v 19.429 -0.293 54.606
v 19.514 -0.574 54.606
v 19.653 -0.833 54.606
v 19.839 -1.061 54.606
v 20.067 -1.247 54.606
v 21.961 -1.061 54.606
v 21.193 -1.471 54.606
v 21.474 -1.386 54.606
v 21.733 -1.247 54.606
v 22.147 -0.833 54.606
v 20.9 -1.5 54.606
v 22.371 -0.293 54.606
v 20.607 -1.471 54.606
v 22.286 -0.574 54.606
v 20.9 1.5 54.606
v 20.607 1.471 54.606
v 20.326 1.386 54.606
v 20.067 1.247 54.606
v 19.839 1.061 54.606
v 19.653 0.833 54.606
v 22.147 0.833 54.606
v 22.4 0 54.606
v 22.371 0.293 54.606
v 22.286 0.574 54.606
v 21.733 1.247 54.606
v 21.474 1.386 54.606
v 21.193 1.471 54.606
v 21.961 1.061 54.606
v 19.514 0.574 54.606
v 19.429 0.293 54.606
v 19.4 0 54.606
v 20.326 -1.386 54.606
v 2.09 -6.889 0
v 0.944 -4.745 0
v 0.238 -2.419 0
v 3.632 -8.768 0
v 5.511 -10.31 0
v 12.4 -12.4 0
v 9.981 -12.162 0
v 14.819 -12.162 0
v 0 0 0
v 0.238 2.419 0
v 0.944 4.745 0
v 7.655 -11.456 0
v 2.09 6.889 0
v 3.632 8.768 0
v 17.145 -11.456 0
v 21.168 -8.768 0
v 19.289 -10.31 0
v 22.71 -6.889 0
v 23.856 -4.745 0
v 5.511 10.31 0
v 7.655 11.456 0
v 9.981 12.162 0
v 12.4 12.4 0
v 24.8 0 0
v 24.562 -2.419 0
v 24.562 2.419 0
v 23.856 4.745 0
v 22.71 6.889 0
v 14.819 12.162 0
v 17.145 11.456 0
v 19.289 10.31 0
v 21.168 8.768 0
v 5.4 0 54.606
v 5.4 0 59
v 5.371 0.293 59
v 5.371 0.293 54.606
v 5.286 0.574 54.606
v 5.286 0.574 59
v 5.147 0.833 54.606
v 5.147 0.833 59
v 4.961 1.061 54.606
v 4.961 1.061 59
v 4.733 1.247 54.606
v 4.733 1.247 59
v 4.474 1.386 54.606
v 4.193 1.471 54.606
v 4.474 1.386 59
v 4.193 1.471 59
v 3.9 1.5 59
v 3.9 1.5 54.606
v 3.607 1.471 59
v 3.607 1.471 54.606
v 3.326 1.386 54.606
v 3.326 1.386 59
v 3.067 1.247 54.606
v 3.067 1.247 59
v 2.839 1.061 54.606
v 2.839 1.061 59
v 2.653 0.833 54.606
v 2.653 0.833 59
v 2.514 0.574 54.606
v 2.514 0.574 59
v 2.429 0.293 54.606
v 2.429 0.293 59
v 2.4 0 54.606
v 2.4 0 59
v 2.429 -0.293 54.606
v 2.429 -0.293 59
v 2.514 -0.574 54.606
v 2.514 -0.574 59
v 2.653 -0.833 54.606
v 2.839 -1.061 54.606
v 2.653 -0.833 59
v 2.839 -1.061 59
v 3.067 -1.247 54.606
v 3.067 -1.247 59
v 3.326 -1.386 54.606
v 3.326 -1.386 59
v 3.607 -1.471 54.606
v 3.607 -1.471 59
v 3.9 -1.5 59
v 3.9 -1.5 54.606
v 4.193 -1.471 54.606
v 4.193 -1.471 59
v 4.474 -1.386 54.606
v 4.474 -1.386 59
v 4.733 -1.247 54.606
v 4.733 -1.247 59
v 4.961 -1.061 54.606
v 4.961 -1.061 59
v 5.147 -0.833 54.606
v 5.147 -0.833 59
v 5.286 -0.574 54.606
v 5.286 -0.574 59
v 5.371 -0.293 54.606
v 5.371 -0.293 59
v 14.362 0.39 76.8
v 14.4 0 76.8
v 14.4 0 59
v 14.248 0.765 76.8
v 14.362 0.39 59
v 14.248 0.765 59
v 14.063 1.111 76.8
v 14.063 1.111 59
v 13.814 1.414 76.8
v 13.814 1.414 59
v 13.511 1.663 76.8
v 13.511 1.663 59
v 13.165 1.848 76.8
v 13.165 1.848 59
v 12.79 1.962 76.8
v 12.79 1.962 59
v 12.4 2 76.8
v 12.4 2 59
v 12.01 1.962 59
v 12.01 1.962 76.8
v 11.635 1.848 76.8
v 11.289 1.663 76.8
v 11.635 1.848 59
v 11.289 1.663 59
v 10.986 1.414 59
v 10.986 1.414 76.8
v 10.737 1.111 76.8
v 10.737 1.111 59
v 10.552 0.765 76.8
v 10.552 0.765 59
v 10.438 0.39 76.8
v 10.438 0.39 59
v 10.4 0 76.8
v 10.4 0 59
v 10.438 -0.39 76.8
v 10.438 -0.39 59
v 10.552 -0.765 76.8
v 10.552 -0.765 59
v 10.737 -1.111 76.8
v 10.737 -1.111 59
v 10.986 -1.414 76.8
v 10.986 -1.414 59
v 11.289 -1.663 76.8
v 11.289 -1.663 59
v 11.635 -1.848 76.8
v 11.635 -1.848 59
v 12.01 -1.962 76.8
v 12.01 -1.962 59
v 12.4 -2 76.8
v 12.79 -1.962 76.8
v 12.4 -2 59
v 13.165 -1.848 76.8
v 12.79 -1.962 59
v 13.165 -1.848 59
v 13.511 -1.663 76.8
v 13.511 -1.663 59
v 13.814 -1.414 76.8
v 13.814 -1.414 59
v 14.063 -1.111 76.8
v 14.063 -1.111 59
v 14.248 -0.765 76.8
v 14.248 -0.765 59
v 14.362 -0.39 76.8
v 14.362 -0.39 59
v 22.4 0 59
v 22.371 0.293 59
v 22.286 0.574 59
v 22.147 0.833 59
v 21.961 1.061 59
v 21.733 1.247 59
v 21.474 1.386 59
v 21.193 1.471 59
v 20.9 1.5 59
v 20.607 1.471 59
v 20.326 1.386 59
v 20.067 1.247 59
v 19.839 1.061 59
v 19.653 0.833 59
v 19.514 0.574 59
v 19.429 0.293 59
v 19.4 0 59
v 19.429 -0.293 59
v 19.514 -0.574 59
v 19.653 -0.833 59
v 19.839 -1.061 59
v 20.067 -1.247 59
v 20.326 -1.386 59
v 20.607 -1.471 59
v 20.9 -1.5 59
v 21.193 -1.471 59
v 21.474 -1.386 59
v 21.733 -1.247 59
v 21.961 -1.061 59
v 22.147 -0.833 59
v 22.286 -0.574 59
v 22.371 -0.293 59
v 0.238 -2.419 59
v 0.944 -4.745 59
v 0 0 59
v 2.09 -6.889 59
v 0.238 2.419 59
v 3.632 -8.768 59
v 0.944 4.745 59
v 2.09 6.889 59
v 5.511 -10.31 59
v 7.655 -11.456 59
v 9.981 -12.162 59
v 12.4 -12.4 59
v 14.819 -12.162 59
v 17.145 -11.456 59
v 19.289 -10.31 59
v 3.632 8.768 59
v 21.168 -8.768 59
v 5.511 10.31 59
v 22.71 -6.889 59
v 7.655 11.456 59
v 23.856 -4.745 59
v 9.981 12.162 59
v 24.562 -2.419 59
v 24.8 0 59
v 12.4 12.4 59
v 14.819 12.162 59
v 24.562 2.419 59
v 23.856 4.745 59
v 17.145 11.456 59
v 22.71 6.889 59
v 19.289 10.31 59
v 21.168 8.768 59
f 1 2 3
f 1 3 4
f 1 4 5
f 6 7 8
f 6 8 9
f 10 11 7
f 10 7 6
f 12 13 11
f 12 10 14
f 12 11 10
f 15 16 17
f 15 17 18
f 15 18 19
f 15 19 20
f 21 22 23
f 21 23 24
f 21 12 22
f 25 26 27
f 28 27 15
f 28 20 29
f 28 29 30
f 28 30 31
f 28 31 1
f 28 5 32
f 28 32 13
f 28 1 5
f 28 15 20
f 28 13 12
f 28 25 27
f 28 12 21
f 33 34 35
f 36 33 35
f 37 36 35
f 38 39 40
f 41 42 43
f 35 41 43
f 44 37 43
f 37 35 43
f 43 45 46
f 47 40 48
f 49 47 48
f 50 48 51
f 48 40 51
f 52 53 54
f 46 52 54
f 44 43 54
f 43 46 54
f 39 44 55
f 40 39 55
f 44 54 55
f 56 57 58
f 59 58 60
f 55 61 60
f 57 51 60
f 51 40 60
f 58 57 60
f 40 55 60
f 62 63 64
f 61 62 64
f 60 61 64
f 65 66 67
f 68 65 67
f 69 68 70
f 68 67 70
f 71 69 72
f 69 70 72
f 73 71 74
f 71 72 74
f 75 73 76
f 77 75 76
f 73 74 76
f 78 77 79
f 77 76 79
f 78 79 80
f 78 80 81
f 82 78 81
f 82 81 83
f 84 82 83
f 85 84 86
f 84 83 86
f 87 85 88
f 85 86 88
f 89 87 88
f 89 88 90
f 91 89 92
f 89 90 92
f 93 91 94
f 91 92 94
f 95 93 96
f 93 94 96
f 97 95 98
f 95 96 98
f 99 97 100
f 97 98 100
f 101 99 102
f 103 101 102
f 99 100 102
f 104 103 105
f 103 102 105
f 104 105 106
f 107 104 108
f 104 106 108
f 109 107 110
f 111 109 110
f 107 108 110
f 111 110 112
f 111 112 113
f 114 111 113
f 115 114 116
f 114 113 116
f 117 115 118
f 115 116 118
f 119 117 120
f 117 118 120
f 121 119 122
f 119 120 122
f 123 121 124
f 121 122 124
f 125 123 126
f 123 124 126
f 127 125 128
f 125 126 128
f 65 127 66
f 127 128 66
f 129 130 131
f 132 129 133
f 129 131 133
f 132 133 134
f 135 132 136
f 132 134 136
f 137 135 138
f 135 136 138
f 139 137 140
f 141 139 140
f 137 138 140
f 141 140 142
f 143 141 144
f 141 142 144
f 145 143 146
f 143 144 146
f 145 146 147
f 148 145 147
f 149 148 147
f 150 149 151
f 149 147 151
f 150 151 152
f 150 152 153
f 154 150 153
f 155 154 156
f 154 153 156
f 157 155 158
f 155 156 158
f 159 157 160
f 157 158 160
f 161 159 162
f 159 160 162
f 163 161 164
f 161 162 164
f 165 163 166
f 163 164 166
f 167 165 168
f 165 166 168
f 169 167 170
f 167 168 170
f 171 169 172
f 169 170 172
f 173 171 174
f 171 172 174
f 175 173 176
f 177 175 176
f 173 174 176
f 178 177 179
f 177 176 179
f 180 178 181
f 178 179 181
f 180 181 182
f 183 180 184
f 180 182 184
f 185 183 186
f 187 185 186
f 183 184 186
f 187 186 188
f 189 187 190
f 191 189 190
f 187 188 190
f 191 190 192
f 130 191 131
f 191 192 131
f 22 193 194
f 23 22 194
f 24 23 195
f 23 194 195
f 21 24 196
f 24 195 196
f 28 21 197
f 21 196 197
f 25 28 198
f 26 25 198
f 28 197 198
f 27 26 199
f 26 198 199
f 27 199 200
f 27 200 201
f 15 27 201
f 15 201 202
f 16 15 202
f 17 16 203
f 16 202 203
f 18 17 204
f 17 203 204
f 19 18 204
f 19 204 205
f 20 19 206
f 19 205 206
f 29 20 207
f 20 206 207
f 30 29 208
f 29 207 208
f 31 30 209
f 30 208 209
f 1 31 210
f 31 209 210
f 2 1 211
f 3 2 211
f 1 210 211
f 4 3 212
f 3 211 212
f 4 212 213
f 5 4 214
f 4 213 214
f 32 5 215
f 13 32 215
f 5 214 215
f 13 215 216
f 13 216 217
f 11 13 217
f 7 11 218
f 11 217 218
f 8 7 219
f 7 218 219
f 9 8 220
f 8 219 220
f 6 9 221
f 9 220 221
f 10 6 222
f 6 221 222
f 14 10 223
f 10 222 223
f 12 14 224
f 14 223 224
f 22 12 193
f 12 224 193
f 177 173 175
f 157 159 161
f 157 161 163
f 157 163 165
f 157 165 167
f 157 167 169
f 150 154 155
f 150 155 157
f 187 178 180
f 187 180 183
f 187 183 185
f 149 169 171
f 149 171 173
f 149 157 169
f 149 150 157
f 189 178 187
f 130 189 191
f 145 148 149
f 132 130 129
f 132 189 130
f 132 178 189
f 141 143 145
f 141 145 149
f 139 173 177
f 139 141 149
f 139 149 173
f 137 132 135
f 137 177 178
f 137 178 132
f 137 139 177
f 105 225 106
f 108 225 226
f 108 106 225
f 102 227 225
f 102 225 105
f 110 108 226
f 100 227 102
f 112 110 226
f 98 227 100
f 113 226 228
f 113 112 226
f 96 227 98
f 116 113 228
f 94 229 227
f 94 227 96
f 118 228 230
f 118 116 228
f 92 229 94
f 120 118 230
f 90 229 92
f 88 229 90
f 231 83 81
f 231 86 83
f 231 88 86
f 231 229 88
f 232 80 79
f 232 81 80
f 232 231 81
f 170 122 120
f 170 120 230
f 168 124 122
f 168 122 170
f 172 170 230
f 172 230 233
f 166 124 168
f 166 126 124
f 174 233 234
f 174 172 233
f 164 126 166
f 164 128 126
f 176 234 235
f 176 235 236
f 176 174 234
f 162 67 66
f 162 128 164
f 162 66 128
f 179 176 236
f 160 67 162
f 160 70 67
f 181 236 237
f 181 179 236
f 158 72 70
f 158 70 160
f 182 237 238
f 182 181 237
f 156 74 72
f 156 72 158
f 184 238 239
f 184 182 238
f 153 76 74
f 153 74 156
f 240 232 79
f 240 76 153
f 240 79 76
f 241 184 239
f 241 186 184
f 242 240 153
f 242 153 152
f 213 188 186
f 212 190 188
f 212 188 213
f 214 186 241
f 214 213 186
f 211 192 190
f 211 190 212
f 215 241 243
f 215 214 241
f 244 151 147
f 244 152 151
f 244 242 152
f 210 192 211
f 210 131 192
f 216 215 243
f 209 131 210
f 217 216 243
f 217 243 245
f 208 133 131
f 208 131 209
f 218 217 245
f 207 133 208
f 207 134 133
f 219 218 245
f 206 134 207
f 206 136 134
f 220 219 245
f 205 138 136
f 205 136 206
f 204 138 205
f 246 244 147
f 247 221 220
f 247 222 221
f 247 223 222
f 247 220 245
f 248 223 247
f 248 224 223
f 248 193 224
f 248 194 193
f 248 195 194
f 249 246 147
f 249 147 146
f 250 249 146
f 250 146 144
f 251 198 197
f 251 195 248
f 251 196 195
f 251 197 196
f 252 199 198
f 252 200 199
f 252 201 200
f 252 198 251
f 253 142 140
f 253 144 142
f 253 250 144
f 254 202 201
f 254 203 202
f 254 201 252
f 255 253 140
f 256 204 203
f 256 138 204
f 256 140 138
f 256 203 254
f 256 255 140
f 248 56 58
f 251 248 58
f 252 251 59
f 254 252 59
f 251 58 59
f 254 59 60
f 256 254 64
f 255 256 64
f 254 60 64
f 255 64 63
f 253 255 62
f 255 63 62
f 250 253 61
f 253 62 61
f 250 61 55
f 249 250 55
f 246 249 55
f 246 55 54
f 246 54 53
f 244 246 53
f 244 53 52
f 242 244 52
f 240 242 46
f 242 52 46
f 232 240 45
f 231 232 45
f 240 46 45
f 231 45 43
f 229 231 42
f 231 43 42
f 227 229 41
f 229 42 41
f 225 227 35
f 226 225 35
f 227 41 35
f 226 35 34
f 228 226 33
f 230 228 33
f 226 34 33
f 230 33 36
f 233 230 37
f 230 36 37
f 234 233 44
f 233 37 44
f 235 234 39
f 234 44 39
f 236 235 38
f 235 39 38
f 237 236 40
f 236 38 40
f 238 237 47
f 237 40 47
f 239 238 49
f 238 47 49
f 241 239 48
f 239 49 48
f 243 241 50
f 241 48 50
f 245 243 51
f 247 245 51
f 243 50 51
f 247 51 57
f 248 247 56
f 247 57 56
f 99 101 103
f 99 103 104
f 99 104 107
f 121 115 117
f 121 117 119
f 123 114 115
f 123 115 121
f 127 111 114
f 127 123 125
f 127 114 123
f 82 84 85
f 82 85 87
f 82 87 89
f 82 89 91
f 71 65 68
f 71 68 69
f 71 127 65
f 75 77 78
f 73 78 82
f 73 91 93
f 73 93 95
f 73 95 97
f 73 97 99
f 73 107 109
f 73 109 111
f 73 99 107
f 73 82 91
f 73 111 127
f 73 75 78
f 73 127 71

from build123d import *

# Parameters (mm, degrees)
SKETCH1_R           = 12.4
BOSS_EXTRUDE1_DEPTH = 59
SKETCH2_R           = 2
BOSS_EXTRUDE2_DEPTH = 17.8
SKETCH3_R           = 1.5
CUT_EXTRUDE1_DEPTH  = 4.3942


with BuildPart() as part:
    # Sketch1 → Boss-Extrude1 (new body)
    with BuildSketch(Plane.XY):
        with Locations((12.4, 0)):
            Circle(SKETCH1_R)
    extrude(amount=BOSS_EXTRUDE1_DEPTH)

    # Sketch2 → Boss-Extrude2 (add)
    with BuildSketch(Plane.XY.offset(59)):
        with Locations((12.4, 0)):
            Circle(SKETCH2_R)
    extrude(amount=BOSS_EXTRUDE2_DEPTH)

    # Sketch3 → Cut-Extrude1 (cut)
    with BuildSketch(Plane.XY.offset(59)):
        with Locations((20.9, 0)):
            Circle(SKETCH3_R)
        with Locations((3.9, 0)):
            Circle(SKETCH3_R)
    extrude(amount=-CUT_EXTRUDE1_DEPTH, mode=Mode.SUBTRACT)


solid = part.part
